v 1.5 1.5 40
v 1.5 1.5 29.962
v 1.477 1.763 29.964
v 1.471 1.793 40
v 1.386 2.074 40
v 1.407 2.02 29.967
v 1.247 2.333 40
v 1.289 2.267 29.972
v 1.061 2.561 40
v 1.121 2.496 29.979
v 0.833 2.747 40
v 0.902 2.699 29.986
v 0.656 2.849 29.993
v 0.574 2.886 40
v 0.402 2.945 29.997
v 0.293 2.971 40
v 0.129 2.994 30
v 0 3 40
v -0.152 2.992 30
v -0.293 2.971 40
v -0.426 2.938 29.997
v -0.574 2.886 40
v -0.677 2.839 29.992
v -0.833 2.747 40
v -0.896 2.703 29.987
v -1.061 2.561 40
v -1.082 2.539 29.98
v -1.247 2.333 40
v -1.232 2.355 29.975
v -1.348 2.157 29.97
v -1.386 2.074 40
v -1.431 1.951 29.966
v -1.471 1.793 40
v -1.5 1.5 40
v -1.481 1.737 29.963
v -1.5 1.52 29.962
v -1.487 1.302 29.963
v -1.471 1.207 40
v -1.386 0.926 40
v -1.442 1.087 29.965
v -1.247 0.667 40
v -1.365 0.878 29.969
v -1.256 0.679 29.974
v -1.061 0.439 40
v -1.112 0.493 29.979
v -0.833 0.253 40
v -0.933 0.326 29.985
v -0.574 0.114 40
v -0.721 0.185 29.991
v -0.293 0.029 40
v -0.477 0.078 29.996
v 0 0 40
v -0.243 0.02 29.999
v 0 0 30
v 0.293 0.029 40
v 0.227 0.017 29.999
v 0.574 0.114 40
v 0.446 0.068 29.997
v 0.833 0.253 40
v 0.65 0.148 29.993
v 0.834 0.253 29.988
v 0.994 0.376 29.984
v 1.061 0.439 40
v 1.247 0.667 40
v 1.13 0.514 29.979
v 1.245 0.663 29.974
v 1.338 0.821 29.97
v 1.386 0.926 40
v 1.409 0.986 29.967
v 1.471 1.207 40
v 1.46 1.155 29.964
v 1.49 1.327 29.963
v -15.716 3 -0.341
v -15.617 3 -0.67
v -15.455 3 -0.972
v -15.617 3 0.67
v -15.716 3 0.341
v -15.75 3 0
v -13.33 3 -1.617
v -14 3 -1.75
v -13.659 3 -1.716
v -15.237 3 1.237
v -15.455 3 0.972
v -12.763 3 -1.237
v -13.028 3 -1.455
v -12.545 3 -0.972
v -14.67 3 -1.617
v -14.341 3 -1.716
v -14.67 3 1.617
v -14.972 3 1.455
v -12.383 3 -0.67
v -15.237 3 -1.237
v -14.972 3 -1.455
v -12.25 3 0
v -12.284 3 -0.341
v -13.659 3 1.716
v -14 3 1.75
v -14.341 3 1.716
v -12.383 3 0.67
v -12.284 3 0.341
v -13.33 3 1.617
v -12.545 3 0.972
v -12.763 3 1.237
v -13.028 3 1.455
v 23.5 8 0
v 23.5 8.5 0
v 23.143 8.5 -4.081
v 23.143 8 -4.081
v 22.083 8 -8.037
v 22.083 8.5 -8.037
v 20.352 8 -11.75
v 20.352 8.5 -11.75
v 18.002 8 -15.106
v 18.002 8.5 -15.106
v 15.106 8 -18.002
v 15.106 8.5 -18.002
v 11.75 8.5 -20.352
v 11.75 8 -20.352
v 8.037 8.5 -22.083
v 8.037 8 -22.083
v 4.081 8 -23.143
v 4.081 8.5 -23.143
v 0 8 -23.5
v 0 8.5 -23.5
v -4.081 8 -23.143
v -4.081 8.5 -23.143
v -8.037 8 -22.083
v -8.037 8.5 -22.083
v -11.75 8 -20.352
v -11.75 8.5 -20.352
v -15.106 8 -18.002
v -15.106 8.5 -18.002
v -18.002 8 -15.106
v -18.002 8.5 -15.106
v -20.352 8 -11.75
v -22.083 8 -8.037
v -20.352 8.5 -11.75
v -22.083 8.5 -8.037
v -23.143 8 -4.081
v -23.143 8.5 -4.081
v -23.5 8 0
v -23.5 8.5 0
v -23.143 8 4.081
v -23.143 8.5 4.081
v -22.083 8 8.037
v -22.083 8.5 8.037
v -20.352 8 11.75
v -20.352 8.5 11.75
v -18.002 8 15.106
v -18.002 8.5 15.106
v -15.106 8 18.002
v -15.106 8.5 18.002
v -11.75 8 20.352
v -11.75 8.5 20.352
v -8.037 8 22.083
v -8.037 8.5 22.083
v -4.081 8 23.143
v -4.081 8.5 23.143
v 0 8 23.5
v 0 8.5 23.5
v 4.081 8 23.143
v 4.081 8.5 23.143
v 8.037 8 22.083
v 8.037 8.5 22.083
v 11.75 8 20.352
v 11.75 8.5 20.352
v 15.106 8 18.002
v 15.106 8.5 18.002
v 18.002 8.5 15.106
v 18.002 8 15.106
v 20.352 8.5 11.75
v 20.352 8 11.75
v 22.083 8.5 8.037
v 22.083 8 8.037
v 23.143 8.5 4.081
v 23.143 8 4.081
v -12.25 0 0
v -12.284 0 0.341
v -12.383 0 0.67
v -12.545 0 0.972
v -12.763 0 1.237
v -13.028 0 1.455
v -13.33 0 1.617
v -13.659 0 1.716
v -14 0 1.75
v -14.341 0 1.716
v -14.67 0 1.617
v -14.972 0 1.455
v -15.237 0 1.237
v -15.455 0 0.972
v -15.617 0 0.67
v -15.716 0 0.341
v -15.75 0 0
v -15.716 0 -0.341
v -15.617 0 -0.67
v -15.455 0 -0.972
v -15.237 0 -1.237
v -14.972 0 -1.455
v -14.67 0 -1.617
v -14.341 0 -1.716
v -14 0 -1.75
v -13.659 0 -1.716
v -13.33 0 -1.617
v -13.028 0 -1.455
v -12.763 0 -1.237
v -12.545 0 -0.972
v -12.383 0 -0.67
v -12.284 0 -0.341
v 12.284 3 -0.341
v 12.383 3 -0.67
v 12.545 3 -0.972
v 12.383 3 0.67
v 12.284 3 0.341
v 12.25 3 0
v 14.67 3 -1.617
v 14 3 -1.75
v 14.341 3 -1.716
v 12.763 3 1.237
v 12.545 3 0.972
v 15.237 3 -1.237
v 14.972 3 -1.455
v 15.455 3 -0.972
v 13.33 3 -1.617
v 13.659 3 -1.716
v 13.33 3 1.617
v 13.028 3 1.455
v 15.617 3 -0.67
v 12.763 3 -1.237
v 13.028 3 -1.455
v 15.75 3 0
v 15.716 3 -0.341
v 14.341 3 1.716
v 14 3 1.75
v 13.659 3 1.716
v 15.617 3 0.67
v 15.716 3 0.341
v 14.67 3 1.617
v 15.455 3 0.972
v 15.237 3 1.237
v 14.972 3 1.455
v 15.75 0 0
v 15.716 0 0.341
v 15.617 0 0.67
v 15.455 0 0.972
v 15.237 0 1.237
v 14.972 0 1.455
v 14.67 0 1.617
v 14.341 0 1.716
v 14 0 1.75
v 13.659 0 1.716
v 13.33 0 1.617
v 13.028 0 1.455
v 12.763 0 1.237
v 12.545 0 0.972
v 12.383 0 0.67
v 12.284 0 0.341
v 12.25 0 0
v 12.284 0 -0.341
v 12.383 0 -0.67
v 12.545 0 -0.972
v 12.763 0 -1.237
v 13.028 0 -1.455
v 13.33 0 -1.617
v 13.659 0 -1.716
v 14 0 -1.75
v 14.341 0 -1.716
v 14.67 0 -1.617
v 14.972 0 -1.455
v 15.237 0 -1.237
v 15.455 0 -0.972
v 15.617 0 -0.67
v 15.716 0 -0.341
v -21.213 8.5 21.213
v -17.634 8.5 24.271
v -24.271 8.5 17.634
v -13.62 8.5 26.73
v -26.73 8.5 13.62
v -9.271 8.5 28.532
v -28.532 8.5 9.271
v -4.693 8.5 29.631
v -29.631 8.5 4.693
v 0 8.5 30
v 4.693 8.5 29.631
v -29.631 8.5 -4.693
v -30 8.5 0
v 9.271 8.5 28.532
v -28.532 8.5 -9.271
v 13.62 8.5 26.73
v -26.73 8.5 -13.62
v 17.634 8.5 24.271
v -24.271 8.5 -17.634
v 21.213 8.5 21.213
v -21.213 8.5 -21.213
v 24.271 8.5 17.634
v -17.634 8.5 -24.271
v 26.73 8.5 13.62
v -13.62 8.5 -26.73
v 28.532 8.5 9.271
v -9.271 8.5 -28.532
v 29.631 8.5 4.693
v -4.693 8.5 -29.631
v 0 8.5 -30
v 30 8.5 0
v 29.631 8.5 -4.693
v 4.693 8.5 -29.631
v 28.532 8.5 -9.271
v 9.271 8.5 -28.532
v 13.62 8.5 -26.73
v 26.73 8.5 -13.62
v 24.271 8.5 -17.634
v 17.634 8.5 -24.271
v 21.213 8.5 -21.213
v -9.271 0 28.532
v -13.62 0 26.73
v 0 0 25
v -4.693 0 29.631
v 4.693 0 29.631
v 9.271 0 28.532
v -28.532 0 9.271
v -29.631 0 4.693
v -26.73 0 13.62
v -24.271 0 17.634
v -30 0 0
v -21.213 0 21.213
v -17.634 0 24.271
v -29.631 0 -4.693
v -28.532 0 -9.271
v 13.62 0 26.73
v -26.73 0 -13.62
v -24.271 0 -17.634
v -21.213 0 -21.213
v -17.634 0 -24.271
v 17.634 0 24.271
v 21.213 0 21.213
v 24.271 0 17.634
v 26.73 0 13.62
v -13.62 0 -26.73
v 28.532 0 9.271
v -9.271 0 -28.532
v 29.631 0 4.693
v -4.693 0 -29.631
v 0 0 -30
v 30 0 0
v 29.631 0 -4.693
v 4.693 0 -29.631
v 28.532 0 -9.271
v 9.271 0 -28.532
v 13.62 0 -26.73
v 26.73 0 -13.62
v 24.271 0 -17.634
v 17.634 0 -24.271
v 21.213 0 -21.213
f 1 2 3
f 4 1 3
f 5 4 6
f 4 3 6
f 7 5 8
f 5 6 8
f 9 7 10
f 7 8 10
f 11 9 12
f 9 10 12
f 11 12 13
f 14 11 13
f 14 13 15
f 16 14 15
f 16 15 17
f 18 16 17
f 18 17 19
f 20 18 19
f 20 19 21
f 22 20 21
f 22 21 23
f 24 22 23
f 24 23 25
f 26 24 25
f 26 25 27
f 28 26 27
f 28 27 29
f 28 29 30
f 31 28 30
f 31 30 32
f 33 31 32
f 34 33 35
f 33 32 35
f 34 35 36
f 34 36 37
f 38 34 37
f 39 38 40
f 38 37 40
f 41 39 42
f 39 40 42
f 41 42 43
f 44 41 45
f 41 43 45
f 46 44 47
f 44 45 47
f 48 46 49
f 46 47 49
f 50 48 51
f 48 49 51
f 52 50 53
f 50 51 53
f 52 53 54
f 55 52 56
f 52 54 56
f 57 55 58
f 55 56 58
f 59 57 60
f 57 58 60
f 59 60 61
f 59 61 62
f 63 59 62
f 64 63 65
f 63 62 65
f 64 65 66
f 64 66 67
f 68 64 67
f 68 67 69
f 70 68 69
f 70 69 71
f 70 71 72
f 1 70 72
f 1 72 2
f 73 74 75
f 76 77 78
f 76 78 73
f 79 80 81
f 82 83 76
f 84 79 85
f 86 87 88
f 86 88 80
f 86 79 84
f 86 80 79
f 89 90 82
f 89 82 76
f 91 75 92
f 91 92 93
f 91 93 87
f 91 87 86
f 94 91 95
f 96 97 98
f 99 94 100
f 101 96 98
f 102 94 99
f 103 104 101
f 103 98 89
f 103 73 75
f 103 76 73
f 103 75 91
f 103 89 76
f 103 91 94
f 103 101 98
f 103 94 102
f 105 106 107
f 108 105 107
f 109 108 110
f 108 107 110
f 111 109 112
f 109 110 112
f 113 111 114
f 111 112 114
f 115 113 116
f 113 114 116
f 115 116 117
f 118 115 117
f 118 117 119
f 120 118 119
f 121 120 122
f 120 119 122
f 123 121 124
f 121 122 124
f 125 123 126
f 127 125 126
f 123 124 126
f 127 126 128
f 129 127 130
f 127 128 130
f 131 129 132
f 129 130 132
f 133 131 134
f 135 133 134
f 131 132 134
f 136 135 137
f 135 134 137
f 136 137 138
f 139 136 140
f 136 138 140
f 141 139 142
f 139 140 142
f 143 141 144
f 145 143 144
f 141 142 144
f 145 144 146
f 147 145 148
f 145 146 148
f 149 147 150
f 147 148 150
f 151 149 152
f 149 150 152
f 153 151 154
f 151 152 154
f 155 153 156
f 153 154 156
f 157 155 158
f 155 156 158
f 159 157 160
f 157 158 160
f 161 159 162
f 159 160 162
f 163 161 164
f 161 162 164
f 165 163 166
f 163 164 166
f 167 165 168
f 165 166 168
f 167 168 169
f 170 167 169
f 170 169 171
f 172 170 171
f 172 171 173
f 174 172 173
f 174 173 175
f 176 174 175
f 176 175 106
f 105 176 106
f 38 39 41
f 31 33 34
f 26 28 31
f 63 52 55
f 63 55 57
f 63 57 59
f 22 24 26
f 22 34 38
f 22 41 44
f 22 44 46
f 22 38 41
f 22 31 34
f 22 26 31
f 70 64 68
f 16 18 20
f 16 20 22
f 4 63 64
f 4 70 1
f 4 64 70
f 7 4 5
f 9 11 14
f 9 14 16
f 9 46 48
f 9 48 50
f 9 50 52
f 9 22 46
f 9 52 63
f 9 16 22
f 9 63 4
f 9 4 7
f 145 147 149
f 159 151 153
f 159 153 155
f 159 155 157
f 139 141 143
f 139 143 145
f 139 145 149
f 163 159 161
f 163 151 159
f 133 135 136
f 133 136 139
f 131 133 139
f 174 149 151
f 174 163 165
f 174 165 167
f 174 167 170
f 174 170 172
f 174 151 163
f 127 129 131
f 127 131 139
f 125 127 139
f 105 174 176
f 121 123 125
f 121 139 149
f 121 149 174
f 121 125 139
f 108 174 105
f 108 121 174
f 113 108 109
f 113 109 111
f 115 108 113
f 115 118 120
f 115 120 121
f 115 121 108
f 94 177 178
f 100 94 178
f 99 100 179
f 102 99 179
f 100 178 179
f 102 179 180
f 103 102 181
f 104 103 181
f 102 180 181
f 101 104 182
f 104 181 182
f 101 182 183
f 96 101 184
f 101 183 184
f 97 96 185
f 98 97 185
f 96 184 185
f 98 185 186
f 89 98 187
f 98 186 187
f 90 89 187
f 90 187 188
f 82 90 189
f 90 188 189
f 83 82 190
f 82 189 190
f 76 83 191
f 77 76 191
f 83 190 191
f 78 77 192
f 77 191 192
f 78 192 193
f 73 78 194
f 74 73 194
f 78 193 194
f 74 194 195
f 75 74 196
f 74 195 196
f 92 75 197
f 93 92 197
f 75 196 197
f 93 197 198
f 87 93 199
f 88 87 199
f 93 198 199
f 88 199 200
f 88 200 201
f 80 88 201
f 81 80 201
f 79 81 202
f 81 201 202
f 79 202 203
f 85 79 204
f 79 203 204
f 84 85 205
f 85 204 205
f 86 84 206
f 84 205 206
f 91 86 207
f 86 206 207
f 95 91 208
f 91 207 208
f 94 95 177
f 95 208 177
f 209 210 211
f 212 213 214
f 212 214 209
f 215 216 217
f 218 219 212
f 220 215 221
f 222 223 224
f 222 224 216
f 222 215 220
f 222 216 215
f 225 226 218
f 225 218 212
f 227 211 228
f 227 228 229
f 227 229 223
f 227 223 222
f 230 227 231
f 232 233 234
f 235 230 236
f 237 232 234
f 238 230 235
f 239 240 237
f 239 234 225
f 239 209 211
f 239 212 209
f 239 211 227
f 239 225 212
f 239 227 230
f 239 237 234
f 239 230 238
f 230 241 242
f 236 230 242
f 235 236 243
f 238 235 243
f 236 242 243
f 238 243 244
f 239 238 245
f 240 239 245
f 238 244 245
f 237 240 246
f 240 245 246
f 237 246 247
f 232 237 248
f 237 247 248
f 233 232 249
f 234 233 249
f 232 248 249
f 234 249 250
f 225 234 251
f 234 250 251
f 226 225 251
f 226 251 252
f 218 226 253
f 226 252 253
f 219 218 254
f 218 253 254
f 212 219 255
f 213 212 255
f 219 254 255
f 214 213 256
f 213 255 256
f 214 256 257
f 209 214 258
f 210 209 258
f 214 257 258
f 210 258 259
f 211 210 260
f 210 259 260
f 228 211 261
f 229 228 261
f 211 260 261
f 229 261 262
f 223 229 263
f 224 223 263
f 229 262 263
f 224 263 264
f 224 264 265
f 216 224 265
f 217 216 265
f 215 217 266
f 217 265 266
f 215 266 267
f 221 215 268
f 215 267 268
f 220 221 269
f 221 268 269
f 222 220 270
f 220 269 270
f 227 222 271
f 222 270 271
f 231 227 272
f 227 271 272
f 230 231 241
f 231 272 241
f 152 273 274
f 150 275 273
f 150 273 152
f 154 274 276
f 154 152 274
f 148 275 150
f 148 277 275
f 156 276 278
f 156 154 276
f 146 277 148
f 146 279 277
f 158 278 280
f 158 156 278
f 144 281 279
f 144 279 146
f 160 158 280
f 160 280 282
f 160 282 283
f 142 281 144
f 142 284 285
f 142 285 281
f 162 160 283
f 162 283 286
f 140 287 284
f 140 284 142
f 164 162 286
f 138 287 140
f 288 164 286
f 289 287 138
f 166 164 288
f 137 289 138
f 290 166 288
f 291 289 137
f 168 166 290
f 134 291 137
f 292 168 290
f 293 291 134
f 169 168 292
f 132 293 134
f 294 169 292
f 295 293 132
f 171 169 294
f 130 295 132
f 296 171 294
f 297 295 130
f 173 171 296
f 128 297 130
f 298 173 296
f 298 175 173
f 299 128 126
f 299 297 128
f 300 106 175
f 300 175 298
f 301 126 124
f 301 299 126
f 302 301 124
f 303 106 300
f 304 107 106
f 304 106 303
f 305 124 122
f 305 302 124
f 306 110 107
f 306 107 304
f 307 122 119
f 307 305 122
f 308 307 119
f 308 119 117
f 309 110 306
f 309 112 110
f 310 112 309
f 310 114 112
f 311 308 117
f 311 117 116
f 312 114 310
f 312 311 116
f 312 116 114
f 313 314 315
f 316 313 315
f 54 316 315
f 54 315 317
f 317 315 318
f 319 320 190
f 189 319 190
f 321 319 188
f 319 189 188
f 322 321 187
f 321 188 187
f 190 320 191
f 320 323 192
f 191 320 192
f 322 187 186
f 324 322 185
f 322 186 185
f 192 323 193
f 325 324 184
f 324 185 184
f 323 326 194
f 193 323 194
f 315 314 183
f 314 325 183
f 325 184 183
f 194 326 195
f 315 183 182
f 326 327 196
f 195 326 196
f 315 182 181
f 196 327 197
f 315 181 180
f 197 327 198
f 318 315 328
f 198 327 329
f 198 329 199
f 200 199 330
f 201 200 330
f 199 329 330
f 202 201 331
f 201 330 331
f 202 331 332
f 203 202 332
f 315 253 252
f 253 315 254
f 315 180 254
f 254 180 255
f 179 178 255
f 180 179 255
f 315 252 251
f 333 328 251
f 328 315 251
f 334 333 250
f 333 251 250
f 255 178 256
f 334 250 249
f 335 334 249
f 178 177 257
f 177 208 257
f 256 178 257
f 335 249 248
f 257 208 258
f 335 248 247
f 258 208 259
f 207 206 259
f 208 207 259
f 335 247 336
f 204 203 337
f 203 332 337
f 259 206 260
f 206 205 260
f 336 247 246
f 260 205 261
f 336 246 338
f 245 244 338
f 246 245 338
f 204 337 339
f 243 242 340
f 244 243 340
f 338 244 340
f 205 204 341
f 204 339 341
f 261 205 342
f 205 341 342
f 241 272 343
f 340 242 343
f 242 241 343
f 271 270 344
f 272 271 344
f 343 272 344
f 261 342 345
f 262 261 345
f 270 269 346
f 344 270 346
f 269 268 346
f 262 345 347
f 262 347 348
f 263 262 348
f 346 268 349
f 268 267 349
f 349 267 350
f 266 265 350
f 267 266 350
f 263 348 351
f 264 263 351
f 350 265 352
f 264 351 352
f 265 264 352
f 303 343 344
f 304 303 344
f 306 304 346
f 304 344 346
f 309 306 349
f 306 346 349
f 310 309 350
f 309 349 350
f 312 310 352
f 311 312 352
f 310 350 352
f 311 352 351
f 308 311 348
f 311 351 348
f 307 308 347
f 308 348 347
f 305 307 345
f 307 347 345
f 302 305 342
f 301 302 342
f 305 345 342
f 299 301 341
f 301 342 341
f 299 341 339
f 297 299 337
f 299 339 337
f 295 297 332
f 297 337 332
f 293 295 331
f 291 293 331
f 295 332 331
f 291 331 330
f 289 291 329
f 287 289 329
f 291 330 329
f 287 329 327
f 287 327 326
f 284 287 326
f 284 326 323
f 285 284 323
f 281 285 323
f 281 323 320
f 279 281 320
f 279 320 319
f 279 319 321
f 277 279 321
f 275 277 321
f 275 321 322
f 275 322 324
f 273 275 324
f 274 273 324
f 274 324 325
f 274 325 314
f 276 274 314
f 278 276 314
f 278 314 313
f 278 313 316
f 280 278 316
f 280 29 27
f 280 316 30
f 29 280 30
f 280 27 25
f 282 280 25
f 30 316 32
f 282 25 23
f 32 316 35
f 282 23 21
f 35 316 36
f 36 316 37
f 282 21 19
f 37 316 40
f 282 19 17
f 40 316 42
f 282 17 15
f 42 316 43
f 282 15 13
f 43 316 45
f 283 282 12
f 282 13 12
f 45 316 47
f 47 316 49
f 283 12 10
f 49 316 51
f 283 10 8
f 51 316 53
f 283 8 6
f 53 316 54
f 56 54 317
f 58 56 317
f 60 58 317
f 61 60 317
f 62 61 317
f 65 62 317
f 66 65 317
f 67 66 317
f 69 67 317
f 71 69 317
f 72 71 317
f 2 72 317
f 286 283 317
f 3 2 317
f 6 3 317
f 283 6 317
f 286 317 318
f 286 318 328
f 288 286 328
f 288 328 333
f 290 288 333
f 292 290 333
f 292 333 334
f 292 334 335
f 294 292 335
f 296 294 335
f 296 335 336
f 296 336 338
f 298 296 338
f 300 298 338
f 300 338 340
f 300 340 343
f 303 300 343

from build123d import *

# Parameters (mm, degrees)
SKETCH_1_R          = 30
EXTRUDE_1_DEPTH     = 8.5
SKETCH_2_R          = 23.5
CUT_EXTRUDE_1_DEPTH = 0.5
SKETCH_3_R          = 1.5
EXTRUDE_2_DEPTH     = 15
SKETCH_4_R          = 1.75
CUT_EXTRUDE_2_DEPTH = 3


with BuildPart() as part:
    # 草图1 → 凸台-拉伸1 (new body)
    with BuildSketch(Plane(origin=(0, 0, 0), x_dir=(1, 0, 0), z_dir=(0, 1, 0))):
        Circle(SKETCH_1_R)
    extrude(amount=EXTRUDE_1_DEPTH)

    # 草图2 → 切除-拉伸1 (cut)
    with BuildSketch(Plane(origin=(0, 8.5, 0), x_dir=(1, 0, 0), z_dir=(0, 1, 0))):
        Circle(SKETCH_2_R)
    extrude(amount=-CUT_EXTRUDE_1_DEPTH, mode=Mode.SUBTRACT)

    # 草图3 → 凸台-拉伸2 (add)
    with BuildSketch(Plane.XY.offset(25)):
        with Locations((0, 1.5)):
            Circle(SKETCH_3_R)
    extrude(amount=EXTRUDE_2_DEPTH)

    # 草图4 → 切除-拉伸2 (cut)
    with BuildSketch(Plane.XZ):
        with Locations((-14, 0)):
            Circle(SKETCH_4_R)
        with Locations((14, 0)):
            Circle(SKETCH_4_R)
    extrude(amount=-CUT_EXTRUDE_2_DEPTH, mode=Mode.SUBTRACT)


solid = part.part
